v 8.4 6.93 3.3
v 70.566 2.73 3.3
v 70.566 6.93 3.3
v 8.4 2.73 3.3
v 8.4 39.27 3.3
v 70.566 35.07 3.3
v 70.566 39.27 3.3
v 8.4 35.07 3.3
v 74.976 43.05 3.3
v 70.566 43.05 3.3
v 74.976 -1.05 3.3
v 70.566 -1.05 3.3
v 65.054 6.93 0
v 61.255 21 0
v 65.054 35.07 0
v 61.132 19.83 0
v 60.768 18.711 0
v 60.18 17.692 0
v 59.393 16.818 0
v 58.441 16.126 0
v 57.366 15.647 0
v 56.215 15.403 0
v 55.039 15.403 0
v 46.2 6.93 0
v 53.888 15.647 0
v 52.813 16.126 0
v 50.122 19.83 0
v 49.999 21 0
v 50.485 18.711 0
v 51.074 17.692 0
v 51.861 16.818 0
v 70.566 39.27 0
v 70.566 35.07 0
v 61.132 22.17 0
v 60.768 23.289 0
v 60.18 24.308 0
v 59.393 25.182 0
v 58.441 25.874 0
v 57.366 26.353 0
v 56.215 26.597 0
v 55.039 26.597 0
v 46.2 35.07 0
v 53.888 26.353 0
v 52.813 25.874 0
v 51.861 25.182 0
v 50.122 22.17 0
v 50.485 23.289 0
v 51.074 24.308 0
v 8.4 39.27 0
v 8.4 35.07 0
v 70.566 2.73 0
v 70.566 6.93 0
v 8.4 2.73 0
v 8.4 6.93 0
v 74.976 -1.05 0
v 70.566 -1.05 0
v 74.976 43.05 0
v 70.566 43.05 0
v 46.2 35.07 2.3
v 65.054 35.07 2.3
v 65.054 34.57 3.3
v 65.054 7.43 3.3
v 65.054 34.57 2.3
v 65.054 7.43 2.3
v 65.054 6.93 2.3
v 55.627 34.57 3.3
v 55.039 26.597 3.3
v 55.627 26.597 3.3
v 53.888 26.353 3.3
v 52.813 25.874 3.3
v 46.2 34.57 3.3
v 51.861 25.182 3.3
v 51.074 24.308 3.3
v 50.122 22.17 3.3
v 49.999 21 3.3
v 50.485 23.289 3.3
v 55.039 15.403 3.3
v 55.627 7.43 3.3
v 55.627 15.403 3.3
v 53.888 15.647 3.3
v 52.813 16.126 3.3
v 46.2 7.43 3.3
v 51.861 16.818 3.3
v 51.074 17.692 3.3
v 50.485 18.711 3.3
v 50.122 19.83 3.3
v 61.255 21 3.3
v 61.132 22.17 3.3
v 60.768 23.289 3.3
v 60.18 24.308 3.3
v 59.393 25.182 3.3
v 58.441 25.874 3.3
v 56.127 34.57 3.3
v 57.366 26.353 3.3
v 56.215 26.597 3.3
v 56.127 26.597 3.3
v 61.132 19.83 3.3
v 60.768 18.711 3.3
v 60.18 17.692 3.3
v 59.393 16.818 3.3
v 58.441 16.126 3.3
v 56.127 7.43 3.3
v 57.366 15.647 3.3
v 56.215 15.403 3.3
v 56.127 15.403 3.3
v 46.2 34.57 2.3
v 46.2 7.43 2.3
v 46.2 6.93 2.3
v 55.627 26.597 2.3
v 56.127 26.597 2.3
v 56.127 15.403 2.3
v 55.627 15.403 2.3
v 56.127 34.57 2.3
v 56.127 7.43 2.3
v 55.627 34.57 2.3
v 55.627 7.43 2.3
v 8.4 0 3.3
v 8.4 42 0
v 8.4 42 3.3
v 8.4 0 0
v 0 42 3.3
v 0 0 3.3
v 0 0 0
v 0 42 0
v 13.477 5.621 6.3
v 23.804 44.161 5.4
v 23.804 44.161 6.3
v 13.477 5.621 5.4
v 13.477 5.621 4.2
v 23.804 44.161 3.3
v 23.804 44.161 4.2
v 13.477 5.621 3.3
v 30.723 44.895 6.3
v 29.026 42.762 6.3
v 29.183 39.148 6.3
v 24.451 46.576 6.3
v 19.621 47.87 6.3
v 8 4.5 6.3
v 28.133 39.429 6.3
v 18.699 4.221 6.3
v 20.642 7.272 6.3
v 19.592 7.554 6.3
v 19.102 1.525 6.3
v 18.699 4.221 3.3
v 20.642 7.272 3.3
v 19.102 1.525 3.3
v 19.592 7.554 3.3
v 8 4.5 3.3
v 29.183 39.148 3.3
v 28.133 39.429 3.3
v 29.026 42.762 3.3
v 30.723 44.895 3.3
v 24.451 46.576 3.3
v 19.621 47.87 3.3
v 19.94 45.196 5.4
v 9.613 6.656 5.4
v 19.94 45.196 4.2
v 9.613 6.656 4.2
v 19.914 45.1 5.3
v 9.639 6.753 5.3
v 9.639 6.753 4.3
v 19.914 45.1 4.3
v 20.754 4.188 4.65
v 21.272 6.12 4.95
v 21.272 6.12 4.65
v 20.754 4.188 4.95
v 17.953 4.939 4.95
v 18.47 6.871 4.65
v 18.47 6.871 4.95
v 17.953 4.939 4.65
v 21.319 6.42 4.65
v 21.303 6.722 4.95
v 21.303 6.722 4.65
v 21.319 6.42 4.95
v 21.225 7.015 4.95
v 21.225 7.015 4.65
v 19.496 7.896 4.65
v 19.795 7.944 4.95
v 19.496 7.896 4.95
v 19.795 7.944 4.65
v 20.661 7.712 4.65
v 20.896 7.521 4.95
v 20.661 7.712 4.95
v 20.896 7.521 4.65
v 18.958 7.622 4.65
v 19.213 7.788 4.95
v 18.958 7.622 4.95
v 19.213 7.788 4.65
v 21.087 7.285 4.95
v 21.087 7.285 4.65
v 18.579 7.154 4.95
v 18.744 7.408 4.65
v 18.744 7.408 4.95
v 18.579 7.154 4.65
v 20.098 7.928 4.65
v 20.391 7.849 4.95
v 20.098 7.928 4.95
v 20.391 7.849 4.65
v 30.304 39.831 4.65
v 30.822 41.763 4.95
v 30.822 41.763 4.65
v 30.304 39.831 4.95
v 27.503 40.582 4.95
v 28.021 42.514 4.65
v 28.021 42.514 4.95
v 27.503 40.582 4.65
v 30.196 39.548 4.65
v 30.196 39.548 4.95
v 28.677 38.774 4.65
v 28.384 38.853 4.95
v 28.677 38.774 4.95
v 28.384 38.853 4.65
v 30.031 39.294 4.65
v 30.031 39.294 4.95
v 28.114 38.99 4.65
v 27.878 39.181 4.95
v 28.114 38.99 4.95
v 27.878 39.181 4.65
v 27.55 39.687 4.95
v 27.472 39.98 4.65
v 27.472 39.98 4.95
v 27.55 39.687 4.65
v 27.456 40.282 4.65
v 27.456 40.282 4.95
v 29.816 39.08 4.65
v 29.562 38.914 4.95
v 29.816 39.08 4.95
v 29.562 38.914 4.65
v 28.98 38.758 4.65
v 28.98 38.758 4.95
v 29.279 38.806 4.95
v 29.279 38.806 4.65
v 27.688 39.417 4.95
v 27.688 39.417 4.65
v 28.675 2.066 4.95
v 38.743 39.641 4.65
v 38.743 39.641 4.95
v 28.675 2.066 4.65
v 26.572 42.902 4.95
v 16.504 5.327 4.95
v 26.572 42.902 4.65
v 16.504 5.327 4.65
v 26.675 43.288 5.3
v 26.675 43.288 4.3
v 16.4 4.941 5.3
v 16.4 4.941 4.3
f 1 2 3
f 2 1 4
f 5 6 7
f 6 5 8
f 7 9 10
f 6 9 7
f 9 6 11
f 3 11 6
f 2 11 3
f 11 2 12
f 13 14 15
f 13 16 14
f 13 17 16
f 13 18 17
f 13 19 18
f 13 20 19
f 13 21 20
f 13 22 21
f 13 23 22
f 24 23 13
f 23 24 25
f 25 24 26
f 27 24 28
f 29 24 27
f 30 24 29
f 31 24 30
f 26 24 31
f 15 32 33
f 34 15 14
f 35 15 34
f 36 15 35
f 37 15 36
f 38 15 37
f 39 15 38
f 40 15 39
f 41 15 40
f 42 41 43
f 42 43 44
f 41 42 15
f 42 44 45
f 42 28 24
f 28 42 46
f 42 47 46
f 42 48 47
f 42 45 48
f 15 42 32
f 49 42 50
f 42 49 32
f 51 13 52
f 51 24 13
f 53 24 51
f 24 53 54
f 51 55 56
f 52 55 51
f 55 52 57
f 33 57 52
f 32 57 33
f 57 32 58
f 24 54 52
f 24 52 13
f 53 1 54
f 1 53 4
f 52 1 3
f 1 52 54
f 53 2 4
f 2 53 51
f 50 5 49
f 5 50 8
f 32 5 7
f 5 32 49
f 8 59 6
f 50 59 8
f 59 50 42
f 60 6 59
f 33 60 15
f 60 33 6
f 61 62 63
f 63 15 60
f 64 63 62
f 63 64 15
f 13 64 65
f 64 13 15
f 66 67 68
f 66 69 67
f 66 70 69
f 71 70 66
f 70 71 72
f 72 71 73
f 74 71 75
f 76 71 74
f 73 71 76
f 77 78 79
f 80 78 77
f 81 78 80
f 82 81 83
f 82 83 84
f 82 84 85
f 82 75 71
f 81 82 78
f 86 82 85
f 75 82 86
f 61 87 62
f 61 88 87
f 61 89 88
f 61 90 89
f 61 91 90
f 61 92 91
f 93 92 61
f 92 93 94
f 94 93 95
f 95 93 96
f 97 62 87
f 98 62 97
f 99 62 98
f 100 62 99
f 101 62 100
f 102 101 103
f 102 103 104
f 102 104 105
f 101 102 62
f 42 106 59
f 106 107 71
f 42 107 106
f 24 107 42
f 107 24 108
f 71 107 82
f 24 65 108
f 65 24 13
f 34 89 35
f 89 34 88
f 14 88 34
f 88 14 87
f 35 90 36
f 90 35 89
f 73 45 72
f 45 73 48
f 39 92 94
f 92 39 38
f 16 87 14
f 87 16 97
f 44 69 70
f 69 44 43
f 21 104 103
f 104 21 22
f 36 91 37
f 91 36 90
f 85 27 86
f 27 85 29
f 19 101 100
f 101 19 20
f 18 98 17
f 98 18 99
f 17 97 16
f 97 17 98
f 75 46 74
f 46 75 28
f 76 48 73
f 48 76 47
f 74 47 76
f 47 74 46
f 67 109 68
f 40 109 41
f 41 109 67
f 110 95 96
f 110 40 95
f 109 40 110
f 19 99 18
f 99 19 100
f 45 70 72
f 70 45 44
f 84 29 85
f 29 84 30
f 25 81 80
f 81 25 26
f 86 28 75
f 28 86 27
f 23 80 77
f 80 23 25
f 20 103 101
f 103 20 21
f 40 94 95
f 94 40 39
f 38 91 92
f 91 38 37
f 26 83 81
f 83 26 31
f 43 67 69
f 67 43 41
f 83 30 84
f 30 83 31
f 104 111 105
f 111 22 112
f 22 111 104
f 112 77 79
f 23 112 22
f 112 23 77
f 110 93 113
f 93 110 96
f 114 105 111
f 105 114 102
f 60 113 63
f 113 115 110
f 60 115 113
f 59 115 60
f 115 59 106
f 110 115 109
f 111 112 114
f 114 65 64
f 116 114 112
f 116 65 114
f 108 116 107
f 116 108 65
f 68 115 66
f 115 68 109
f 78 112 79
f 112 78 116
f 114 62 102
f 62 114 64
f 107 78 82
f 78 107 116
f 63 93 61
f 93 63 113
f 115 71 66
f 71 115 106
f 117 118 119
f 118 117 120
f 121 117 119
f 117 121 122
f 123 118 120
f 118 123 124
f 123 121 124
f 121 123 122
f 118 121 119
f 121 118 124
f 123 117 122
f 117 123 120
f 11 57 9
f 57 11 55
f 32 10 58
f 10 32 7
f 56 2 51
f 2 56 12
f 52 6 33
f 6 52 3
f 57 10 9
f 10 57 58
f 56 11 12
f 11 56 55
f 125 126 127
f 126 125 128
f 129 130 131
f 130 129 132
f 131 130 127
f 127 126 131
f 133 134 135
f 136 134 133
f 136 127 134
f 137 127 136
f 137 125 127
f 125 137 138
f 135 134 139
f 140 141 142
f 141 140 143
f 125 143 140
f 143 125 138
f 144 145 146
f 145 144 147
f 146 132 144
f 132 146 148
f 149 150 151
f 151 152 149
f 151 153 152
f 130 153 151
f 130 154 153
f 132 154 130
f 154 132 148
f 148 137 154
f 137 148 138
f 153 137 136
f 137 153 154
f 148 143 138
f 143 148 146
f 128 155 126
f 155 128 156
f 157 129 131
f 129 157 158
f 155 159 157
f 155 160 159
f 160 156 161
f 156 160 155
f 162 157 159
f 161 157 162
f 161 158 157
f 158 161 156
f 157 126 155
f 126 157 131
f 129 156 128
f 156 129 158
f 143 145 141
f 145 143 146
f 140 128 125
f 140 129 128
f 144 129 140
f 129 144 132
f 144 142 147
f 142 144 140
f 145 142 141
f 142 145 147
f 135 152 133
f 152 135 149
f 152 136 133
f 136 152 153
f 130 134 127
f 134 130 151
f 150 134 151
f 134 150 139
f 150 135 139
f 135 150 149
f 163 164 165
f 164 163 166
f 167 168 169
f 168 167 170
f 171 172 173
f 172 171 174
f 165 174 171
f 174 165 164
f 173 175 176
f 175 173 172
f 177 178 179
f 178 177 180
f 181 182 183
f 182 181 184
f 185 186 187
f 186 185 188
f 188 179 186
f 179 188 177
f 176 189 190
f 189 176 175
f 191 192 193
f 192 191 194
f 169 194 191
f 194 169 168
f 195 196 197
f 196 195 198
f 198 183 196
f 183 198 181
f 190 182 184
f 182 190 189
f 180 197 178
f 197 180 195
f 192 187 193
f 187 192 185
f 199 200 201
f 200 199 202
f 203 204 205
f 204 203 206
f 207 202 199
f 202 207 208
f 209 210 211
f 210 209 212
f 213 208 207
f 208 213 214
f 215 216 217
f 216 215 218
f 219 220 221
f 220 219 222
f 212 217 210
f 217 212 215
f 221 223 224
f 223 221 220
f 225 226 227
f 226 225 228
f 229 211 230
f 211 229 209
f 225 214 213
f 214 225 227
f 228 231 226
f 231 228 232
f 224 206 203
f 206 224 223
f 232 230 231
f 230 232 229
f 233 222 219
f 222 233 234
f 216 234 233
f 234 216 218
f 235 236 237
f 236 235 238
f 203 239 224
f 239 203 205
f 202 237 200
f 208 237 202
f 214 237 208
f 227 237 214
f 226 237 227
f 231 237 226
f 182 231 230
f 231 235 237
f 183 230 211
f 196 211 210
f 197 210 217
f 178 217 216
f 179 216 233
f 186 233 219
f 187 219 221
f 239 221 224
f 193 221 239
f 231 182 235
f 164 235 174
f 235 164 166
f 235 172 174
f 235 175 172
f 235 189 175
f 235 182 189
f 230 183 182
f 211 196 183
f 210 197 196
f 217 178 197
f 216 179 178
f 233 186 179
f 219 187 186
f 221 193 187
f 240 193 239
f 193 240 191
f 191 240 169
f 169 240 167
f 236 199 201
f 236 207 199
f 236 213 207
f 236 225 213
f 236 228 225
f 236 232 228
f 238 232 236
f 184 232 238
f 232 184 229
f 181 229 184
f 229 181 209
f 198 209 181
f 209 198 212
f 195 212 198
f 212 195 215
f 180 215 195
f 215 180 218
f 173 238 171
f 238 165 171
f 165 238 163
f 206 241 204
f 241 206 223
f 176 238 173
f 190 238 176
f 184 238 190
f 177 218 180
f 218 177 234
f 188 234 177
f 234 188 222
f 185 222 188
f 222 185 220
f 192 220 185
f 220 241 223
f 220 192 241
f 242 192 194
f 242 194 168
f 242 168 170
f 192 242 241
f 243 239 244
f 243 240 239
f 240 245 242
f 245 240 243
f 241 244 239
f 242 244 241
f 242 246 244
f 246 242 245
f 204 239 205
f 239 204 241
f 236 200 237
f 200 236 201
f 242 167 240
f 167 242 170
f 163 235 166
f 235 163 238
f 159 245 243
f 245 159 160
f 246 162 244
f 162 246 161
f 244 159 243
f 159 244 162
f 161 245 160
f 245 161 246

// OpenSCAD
// file: frame.scad
frame_depth = 3.3;
stock_inset_height = 0.5;
stock_inset_depth = 1.0;

header_width = 42.0;
header_height = header_width * 0.2;
footer_width = header_width * 1.05;
footer_height = footer_width * 0.1;
riser_width = header_width * 0.1;
riser_height = header_height * 4.5;
stock_width = header_width * 0.67;
stock_height = stock_width * 0.67;
stock_foot_height = footer_height * 1.25;
neck_radius = stock_width / 5;

header_riser_offset = ((header_width - stock_width) / 2) - riser_width;

module frame() {
	cube([header_height, header_width, frame_depth]);
	translate([header_height, header_riser_offset, 0]) {
		cube([riser_height + stock_height + stock_foot_height, riser_width, frame_depth]);
		translate([0, stock_width + riser_width, 0]) {
			cube([riser_height + stock_height + stock_foot_height, riser_width, frame_depth]);
		}
	}
	translate([header_height + riser_height, header_riser_offset + riser_width, 0]) {
		difference() {
		cube([stock_height, stock_width, frame_depth]);
		translate([stock_height / 2, stock_width / 2, -clean_buffer]) {
			cylinder(h = frame_depth + (clean_buffer * 2),
				r1 = neck_radius, r2 = neck_radius);
		}
		translate([stock_height / 2, 0, frame_depth - stock_inset_depth]) {
			cube([stock_inset_height, stock_width, stock_inset_depth + clean_buffer]);
		}
		translate([0, 0, frame_depth - stock_inset_depth]) {
			cube([stock_height, stock_inset_height, stock_inset_depth + clean_buffer]);
		}
		translate([0, stock_width - stock_inset_height, frame_depth - stock_inset_depth]) {
			cube([stock_height, stock_inset_height, stock_inset_depth + clean_buffer]);
		}
		}
	}
	translate([
		header_height + riser_height + stock_height + stock_foot_height,
		(header_width - footer_width) / 2,
		0
	]) {
		cube([footer_height, footer_width, frame_depth]);
	}
}
// file: blade.scad
razor_carrier_width = 39.7;
razor_carrier_depth = 1.0;
razor_carrier_height = 7.0;
razor_blade_width = 38.9;
razor_blade_depth = 0.3;
razor_blade_height = 19.6 - razor_carrier_height;
razor_notch_width = (razor_blade_width - 32.0) / 2;
razor_notch_radius = 2.9 / 2;
razor_notch_height = 8.5;

sled_razor_clearance = 0.2;
sled_razor_inset = 4.0;
sled_nib_width = (razor_notch_width * 1.0) - (0*sled_razor_clearance);
sled_nib_height = razor_notch_radius * 0.75;
sled_slot_width = razor_carrier_width + sled_razor_clearance;
sled_slot_height = razor_notch_height + (sled_nib_height / 2) + razor_notch_radius - sled_razor_inset;
sled_slot_depth = razor_carrier_depth + sled_razor_clearance;
sled_header_height = 5;
sled_header_width = sled_slot_height + 1;
sled_side_width = 2.5;
sled_height = sled_slot_height + sled_header_height;
sled_width = sled_slot_width + sled_side_width * 2;
sled_depth = razor_carrier_depth + 2;

module blade() {
	cube([razor_carrier_height, razor_carrier_width, razor_carrier_depth]);
	translate([
		razor_carrier_height,
		(razor_carrier_width - razor_blade_width) / 2,
		razor_carrier_depth / 2 - razor_blade_depth / 2
	]) {
		difference() {
			cube([razor_blade_height, razor_blade_width, razor_blade_depth]);
			translate([
				razor_notch_radius + (razor_notch_height - razor_carrier_height),
				razor_notch_width - razor_notch_radius,
				-razor_blade_depth
			]) {
				translate([-razor_notch_radius, -razor_notch_width, 0]) {
					cube([razor_notch_radius * 2, razor_notch_width, razor_carrier_depth]);
				}
				cylinder(h = razor_carrier_depth,
					r1 = razor_notch_radius, r2 = razor_notch_radius);
			}
			translate([
				razor_notch_radius + (razor_notch_height - razor_carrier_height),
				razor_blade_width - razor_notch_width + razor_notch_radius,
				-razor_blade_depth
			]) {
				translate([-razor_notch_radius, 0, 0]) {
					cube([razor_notch_radius * 2, razor_notch_width, razor_carrier_depth]);
				}
				cylinder(h = razor_carrier_depth,
					r1 = razor_notch_radius, r2 = razor_notch_radius);
			}
		}
	}
}

module sled() {
	difference() {
		cube([sled_header_height, sled_width, sled_depth]);
		translate([
			sled_header_height - sled_razor_inset,
			sled_side_width, (sled_depth / 2) - (sled_slot_depth / 2)
		]) {
			cube([sled_razor_inset + clean_buffer, sled_slot_width, sled_slot_depth]);
		}
	}
	translate([sled_header_height, 0, 0]) {
		cube([sled_slot_height, sled_side_width, sled_depth]);
		translate([sled_slot_height - sled_nib_height, sled_side_width, 0]) {
			cube([sled_nib_height, sled_nib_width, sled_depth]);
		}
	}
	translate([sled_header_height, sled_slot_width + sled_side_width, 0]) {
		cube([sled_slot_height, sled_side_width, sled_depth]);
		translate([sled_slot_height - sled_nib_height, -sled_nib_width, 0]) {
			cube([sled_nib_height, sled_nib_width, sled_depth]);
		}
	}
}

module blade_on_sled() {
	color([0, 0.3, 0.7, 1]) {
		sled();
	}
	translate([
		sled_height - sled_slot_height - sled_razor_inset,
		(sled_width - razor_carrier_width) / 2,
		(sled_depth / 2) - (razor_carrier_depth / 2)
	]) {
		color([0.6, 0.3, 0, 1]) {
			blade();
		}
	}
}
// main file
clean_buffer = 0.01;
$fs = 0.2;
//$t = 0.0;

include <blade.scad>;
include <frame.scad>;

color([0,0.5,0.4,1]) {
	frame();
}

translate([8 + ($t * 30), 4.5, frame_depth]) {
	rotate(-15) {
		blade_on_sled();
	}
}
